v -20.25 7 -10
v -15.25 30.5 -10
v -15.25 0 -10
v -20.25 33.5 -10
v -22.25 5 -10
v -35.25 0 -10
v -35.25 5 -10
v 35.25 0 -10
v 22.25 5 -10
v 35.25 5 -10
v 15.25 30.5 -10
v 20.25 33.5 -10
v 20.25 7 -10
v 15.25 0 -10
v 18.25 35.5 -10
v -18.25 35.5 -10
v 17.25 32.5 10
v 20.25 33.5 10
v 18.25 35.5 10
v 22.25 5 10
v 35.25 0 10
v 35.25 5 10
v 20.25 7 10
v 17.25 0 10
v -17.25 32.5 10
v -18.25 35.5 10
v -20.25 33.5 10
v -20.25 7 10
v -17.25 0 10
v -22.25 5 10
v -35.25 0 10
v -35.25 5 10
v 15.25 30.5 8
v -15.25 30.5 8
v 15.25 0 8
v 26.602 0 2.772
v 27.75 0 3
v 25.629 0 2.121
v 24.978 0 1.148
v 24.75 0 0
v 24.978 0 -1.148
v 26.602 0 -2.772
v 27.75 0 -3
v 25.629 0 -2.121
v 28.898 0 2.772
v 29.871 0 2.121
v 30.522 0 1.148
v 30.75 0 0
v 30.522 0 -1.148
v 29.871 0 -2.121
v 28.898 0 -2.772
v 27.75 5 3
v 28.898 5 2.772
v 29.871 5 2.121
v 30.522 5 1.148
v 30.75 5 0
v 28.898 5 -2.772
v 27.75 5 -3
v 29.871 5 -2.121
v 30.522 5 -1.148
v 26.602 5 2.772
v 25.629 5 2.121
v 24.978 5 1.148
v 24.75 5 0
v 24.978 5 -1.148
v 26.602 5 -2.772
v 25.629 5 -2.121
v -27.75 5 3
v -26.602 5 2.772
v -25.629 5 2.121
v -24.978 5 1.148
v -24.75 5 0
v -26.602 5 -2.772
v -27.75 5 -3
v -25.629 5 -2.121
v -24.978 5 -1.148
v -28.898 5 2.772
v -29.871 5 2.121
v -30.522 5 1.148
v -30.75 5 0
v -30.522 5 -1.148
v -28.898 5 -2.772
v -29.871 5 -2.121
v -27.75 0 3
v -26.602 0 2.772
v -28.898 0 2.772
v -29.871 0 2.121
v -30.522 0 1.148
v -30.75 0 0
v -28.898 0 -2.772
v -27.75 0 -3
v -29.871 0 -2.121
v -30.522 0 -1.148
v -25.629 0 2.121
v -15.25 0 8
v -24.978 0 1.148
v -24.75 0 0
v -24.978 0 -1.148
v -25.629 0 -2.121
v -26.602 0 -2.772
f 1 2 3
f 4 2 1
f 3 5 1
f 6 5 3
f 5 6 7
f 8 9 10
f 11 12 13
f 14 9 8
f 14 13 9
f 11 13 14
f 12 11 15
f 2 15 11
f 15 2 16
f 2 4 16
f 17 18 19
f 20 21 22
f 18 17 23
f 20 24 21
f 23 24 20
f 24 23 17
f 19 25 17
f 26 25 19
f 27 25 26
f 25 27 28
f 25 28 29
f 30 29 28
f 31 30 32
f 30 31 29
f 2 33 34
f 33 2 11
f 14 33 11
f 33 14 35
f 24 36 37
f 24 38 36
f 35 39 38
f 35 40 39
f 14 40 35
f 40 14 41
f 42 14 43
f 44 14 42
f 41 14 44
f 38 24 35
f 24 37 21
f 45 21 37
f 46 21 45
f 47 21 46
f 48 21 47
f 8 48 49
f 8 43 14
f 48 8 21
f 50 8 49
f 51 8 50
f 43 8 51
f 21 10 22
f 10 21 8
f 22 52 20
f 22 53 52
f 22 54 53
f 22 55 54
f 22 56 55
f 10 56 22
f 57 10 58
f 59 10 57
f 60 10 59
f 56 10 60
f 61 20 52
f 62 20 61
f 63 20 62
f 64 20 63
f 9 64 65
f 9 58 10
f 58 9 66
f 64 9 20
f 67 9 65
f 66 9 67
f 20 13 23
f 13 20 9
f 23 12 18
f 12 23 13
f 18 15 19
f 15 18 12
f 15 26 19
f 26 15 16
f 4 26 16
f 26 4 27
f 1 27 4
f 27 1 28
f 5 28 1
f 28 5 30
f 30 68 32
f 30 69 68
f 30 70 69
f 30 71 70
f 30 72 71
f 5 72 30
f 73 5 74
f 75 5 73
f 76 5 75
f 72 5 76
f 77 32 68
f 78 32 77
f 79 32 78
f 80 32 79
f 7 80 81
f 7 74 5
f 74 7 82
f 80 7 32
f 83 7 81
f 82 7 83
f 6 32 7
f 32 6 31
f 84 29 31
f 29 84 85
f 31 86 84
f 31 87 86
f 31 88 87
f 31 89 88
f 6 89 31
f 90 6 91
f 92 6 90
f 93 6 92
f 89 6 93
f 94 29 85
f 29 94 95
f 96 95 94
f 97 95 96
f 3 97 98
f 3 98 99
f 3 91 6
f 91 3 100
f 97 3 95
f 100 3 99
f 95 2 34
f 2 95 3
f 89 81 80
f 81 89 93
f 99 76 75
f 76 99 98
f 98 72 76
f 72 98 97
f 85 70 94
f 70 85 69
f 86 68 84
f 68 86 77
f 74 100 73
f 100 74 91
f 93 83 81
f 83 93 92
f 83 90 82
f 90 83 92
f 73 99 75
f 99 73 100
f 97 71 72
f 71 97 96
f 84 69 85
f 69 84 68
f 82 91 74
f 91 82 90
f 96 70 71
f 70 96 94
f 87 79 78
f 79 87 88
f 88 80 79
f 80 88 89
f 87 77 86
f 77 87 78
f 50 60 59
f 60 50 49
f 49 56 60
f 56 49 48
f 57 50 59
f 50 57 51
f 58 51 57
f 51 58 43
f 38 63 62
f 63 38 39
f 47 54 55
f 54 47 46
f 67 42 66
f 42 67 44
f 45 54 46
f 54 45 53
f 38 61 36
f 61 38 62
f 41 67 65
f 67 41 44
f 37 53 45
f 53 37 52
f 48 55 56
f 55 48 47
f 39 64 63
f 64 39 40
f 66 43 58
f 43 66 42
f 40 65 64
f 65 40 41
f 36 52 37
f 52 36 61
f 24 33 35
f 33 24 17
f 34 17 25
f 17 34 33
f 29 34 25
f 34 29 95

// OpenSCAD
// file: config.scad
// Paramètres de la machine

decal=-30;            // décallage du chassis xz
hauteur=400;          // hauteur totale chassis
largeur=350;          // largeur totale chassis
longueur=500;         // longueur totale chassis
hauteur_base=90;      // hauteur de la base
entraxe_y=140;        // distance entre les tiges Ø8 axe Y

couleur=[1,0.6,0];



// Paramètre des pièces et jeux

// écart plateau/courroie
// y_belt_holder
belt_h=13;      // écart entre la courroie et le plateau

// écart plateau/tiges lisses
// y_lm8uu
decal_plateau=12; // Décallage en Y

// décallage des tiges lisses Y
// support_tige8_y
decal_tiges=5;

// décallage moteur Y
// y_motor
decal_motory_z=11;
decal_motory_y=25;

// Plats écrous
ec3=5.7;
ec4=7.2;
ec5=8.2;
ec6=10.2;

// Jeu sur plats pour les écrous glissants
jec=0.2;

// hauteur écrous
ec3h=2.4;
ec4h=3.2;
ec5h=4.7;
ec6h=5.2;

// Vis
vis3=3.5;
vis4=4.5;
vis5=5.5;
vis6=6.5;

// nombre de dents des poulies
poulie=20;
// main file
include <config.scad>;

ep=5;      // épaisseur
pro=30.5;  // taille du profilé
pat=15;    // longueur des pattes
lar=20;    // largeur
diam=6;    // diamètre des trous
cha=2;     // chanfrein
cha2=2;    // chanfrein d'entrée
difference(){

  linear_extrude(height=lar, center=true, convexity=10)
  polygon(points=[
    [pro/2,0],
    [pro/2+ep+pat,0],
    [pro/2+ep+pat,ep],
    [pro/2+ep+cha,ep],
    [pro/2+ep,ep+cha],
    [pro/2+ep,pro+ep-cha],
    [pro/2+ep-cha,pro+ep],
    [-pro/2-ep+cha,pro+ep],
    [-pro/2-ep,pro+ep-cha],
    [-pro/2-ep,ep+cha],
    [-pro/2-ep-cha,ep],
    [-pro/2-ep-pat,ep],
    [-pro/2-ep-pat,0],
    [-pro/2,0],
    [-pro/2,pro],
    [pro/2,pro],
    [pro/2,0]
    ]) ;
  translate([-ep-(pro+pat)/2,-1,0]) rotate([-90,0,0]) cylinder(d=diam, h=ep+2, $fn=16);
  translate([ep+(pro+pat)/2,-1,0]) rotate([-90,0,0]) cylinder(d=diam, h=ep+2, $fn=16);
  translate([0,pro/2,lar/2-cha2]) rotate([0,0,45]) cylinder(d1=pro*sqrt(2),d2=(pro+cha2*2+0.2)*sqrt(2), h=cha2+0.1, $fn=4);
}
